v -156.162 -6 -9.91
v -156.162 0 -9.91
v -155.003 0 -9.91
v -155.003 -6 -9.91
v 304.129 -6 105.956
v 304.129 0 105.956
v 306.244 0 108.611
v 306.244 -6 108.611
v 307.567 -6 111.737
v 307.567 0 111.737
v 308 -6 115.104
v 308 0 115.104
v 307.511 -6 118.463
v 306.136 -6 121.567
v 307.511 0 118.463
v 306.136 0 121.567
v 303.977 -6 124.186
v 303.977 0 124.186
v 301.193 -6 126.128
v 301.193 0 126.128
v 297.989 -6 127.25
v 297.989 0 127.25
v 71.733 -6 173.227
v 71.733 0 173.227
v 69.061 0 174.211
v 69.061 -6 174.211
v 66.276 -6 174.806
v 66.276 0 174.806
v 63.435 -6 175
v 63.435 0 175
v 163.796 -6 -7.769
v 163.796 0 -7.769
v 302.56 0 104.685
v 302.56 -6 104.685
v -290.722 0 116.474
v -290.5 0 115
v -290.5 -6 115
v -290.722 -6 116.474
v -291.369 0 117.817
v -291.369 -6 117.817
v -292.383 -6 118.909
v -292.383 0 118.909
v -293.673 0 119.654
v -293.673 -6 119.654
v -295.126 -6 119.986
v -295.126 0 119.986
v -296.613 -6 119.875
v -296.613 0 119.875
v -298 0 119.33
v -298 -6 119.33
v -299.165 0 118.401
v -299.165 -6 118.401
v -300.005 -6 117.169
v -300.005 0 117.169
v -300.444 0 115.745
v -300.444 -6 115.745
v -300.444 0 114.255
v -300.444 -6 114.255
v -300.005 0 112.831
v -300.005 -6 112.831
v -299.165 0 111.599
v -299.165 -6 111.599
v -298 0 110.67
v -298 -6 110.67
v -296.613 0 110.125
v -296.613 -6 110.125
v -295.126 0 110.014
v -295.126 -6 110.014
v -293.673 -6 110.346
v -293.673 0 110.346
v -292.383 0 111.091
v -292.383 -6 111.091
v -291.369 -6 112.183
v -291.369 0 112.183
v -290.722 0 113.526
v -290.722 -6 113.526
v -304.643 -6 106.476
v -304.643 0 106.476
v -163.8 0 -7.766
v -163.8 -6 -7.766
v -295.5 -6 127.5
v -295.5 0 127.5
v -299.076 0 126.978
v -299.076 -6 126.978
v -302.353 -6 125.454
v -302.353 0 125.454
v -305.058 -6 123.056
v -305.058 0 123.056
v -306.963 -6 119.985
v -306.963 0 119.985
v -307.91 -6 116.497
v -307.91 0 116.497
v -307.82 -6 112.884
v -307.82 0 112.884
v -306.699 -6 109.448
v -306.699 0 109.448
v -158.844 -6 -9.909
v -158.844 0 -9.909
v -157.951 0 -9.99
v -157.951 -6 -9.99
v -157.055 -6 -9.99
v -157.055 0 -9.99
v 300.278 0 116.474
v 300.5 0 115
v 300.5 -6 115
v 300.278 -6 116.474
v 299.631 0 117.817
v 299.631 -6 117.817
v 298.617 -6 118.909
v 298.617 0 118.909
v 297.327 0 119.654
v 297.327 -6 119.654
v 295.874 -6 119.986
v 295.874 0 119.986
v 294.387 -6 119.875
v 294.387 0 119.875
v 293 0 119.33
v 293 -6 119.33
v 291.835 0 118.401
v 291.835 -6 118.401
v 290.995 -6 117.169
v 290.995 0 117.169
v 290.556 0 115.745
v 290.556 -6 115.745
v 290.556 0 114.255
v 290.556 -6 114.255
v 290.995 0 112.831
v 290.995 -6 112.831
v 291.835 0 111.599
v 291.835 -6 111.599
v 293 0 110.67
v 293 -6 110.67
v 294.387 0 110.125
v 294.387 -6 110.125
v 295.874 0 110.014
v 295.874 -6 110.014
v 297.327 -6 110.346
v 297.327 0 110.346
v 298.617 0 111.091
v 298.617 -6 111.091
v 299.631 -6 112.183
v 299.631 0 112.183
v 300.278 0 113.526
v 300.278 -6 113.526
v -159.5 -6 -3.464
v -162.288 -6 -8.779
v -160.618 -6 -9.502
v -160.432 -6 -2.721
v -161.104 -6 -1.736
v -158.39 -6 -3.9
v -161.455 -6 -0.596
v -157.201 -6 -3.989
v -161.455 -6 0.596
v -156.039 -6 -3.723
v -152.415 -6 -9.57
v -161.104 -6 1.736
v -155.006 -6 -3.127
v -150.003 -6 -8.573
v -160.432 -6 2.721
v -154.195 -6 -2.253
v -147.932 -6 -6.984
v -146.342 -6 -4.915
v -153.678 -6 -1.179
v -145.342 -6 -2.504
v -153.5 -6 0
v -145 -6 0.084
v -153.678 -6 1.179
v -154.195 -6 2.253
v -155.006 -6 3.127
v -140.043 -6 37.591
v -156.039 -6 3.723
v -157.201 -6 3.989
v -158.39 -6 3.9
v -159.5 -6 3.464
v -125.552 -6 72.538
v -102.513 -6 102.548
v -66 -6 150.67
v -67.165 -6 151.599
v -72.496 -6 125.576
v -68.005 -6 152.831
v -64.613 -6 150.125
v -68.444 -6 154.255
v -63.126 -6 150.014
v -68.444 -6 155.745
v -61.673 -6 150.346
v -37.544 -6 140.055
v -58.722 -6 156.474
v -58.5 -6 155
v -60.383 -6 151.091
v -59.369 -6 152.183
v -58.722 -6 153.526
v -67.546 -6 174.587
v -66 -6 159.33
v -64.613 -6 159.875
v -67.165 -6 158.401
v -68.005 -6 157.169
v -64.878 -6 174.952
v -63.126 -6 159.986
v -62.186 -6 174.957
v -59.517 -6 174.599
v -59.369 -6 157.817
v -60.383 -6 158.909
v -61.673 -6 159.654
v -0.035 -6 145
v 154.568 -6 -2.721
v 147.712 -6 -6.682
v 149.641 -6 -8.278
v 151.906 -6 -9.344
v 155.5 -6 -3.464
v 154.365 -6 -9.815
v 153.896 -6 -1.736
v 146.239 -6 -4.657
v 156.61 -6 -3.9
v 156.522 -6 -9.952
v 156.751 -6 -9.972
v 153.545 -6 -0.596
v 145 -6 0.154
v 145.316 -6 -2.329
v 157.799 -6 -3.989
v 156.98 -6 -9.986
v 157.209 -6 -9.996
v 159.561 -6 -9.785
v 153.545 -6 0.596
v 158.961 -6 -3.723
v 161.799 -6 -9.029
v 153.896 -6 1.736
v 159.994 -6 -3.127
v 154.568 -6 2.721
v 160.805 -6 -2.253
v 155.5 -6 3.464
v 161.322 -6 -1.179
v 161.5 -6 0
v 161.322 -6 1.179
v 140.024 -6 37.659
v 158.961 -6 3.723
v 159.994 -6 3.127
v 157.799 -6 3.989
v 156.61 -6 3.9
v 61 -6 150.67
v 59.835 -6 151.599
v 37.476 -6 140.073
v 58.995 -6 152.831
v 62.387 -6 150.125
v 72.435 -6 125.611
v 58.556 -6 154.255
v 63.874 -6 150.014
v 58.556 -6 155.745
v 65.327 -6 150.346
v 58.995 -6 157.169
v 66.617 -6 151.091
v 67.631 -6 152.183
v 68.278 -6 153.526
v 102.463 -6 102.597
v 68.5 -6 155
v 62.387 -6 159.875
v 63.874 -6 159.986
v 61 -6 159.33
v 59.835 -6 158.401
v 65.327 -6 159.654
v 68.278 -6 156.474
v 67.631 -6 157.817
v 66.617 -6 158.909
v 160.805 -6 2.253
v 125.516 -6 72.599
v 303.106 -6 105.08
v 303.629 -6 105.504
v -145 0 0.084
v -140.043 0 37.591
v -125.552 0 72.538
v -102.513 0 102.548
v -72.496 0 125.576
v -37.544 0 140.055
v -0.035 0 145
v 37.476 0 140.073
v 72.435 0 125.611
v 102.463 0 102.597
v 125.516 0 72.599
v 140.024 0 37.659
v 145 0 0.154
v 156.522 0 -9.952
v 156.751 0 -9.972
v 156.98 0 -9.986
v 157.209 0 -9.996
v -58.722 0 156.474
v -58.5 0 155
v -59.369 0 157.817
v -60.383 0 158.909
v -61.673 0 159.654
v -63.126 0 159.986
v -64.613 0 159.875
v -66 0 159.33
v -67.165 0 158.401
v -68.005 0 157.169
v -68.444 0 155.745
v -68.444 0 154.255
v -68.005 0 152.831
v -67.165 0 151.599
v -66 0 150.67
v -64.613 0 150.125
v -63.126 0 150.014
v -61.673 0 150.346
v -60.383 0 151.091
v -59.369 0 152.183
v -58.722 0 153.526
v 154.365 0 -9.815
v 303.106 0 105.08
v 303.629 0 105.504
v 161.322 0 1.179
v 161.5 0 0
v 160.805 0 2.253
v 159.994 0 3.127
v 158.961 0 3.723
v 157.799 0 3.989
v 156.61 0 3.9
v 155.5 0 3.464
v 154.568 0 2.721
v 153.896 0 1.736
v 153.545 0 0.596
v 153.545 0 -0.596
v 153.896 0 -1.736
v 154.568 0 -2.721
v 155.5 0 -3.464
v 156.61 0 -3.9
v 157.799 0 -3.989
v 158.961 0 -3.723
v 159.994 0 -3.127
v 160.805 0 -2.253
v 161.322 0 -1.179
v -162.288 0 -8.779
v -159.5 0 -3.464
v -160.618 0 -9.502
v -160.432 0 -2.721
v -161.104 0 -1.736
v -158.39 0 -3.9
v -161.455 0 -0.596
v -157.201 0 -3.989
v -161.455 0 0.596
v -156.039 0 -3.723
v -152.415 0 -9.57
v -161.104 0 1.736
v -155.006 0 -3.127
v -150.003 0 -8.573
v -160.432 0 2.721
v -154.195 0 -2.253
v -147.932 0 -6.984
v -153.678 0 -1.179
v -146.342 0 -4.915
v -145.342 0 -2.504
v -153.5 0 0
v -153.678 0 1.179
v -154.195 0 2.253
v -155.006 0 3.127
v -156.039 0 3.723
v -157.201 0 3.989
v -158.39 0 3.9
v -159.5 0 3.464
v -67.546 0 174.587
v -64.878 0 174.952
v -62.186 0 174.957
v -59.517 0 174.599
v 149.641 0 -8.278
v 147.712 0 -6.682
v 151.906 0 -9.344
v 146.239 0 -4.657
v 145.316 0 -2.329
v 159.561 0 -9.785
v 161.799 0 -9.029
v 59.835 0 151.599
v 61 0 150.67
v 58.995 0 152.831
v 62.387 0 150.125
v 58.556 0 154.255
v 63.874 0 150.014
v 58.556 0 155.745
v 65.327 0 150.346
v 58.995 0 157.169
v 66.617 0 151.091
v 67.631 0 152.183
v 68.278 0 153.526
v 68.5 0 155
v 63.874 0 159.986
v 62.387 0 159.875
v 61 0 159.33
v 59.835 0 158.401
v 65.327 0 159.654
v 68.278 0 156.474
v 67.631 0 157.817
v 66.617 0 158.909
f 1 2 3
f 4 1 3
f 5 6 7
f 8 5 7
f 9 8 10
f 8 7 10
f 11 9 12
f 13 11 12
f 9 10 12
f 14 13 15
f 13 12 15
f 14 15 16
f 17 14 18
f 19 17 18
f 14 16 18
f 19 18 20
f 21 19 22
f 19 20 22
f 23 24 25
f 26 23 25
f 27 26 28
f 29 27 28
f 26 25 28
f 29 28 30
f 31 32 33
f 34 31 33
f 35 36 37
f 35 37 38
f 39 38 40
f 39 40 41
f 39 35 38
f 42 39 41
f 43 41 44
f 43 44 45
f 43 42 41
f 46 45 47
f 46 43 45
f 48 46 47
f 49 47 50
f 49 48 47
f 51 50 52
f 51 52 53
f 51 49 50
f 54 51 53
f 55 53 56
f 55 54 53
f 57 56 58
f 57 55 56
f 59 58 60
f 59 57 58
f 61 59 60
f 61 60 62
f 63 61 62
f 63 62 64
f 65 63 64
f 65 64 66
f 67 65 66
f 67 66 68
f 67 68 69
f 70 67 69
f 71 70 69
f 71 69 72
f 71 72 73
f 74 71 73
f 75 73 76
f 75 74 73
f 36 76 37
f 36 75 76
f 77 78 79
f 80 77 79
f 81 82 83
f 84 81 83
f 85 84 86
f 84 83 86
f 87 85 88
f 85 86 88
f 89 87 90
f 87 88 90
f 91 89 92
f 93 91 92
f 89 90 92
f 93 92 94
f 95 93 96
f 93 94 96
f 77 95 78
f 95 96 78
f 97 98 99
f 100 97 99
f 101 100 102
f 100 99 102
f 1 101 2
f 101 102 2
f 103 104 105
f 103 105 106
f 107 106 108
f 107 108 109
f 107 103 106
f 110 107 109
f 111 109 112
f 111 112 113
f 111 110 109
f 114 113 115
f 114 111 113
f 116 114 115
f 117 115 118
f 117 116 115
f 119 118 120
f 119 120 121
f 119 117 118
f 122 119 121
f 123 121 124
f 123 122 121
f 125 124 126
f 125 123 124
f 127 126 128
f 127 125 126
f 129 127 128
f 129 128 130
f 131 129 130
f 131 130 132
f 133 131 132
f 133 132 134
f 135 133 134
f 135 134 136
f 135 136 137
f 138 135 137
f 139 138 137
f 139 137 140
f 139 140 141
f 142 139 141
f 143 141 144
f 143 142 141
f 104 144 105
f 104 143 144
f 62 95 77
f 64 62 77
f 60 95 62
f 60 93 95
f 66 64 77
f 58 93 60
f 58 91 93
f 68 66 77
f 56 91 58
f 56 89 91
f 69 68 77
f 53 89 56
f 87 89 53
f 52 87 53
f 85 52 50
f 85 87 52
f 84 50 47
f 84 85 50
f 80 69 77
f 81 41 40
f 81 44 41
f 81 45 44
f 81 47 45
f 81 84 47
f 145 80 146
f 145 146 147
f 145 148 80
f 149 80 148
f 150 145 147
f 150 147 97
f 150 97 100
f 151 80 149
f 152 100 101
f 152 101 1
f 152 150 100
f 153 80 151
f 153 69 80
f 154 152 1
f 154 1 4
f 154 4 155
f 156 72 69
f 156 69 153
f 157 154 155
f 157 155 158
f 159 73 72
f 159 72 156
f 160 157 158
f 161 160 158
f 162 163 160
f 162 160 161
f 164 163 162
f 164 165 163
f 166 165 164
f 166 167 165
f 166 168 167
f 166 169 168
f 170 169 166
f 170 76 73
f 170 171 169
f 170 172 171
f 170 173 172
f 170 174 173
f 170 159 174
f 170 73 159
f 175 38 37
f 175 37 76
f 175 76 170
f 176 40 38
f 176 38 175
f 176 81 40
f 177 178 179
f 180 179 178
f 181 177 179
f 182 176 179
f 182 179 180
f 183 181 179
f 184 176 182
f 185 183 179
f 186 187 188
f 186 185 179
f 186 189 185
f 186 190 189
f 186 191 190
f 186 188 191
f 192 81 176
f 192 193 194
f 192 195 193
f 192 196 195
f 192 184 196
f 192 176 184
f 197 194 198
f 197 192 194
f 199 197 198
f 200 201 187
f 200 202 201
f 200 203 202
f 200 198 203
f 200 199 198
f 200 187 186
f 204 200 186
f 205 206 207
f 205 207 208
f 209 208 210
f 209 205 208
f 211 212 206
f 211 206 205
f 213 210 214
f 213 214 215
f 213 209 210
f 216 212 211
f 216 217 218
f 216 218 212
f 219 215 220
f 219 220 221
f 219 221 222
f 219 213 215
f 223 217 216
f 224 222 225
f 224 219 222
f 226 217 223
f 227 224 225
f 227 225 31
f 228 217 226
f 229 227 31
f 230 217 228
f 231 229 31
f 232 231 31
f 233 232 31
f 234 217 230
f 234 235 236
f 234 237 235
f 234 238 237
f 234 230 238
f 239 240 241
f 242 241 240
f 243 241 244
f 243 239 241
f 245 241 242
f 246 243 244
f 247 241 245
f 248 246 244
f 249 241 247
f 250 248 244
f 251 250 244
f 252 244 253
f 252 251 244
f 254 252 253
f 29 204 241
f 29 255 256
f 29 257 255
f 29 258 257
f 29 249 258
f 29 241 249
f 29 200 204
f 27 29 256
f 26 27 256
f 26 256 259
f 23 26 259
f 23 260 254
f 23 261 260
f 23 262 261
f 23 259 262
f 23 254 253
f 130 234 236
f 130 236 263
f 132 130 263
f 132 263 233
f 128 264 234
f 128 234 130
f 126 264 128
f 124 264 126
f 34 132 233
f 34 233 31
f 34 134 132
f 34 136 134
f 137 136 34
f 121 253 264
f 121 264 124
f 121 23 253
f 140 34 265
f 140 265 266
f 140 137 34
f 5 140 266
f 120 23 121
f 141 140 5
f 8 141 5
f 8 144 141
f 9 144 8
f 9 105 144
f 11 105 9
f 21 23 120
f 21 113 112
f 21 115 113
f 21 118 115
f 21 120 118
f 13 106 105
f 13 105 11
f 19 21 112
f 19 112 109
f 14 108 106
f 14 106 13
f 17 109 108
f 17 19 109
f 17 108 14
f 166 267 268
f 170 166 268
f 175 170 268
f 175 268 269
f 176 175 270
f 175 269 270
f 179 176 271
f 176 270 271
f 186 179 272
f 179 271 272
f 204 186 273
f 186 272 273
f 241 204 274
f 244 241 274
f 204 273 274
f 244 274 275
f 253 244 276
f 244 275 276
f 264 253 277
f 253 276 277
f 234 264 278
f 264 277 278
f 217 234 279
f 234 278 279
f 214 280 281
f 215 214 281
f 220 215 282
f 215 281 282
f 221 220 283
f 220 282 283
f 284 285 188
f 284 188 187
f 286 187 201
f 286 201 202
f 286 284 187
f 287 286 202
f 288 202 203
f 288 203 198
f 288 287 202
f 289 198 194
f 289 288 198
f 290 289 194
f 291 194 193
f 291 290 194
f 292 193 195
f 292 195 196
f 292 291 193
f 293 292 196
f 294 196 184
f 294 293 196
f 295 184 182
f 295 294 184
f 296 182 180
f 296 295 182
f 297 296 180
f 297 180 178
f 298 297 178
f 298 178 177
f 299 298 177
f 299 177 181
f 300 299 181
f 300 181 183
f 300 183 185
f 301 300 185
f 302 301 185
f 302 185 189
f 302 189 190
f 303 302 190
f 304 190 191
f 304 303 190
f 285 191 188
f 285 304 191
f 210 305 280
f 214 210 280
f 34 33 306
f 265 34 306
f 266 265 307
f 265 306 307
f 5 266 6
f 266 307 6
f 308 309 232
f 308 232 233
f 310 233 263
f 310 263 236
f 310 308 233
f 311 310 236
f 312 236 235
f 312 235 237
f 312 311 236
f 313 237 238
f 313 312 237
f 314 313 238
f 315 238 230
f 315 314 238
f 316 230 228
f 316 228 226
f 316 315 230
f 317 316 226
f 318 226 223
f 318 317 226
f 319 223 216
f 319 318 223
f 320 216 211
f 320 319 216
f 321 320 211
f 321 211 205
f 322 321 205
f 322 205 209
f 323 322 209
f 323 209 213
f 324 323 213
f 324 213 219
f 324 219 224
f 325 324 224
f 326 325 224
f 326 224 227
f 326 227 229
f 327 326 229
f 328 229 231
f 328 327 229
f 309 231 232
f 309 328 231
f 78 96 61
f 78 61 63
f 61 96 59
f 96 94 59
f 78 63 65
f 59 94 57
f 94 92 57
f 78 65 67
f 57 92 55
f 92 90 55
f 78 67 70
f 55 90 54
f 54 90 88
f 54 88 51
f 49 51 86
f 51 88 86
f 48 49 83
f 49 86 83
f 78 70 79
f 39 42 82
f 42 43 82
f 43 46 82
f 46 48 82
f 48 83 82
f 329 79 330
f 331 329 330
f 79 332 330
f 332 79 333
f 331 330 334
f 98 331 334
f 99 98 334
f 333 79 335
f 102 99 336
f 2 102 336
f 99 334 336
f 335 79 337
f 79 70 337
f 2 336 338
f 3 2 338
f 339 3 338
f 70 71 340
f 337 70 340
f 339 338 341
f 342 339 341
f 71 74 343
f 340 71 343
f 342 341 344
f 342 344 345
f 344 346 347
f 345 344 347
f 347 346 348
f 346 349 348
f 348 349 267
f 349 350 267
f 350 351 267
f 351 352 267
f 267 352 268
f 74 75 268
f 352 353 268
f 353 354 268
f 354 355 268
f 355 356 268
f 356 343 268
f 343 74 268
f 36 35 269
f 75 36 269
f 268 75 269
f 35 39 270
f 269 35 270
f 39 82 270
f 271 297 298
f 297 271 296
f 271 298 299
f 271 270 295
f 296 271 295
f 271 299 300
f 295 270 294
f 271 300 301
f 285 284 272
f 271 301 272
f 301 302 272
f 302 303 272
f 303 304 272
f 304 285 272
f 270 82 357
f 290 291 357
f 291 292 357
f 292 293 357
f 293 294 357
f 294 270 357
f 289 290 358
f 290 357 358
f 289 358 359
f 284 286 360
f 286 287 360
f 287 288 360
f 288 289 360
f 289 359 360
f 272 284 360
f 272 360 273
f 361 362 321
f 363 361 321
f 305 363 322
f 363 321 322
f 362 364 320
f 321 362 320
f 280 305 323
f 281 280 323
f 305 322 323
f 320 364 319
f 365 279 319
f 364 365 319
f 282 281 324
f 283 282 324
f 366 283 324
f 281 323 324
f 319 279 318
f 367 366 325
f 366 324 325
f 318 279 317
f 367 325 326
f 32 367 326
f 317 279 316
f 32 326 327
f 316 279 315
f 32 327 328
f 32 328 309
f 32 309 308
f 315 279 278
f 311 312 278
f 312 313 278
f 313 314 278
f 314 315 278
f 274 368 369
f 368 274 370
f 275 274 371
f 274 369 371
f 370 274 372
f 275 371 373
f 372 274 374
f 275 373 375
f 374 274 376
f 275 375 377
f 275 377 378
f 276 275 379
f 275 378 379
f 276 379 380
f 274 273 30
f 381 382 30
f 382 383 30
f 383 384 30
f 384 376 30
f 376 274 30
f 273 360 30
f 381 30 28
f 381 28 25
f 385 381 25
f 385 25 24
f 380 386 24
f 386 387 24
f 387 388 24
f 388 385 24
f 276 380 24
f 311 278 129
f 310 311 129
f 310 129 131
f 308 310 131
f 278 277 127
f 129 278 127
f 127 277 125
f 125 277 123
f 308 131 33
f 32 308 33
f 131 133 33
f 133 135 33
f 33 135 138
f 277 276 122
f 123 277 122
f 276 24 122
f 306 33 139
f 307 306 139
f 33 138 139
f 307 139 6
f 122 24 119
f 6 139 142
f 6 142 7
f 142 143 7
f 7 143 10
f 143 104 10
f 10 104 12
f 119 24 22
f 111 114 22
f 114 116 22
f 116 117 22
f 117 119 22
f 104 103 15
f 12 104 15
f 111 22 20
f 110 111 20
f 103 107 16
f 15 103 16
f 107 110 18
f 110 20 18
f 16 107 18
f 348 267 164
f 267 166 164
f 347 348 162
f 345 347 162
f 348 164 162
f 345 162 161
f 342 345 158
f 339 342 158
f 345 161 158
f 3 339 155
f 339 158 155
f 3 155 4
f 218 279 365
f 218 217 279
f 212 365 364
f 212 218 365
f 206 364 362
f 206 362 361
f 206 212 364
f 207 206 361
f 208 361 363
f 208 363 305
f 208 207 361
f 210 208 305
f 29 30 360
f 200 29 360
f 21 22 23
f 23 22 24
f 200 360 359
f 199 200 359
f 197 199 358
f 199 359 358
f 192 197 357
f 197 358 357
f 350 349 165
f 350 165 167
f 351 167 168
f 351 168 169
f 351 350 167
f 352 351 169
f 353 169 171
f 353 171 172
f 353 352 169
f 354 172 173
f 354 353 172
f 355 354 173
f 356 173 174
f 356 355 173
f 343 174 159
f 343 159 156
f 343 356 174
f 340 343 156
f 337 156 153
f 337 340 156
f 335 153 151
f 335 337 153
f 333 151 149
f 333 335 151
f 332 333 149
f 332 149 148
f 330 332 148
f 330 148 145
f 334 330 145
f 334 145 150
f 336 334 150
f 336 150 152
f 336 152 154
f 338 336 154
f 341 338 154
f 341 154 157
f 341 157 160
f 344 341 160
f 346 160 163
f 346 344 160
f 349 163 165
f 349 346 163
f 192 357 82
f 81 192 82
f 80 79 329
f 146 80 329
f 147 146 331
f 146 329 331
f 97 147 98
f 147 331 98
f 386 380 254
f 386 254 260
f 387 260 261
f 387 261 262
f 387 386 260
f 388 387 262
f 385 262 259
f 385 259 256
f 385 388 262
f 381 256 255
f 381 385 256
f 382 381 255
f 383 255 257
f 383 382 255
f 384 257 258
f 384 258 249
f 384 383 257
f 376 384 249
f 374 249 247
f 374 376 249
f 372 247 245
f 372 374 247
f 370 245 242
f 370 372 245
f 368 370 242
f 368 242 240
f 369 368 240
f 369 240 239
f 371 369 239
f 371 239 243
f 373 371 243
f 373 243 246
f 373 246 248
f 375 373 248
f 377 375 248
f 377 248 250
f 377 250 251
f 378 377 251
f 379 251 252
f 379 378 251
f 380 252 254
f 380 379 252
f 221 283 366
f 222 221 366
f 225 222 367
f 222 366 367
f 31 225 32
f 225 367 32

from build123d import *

# Parameters (mm, degrees)
F0_R     = 4
F0_R_2   = 5
F1_DEPTH = 6
F2_R     = 10


with BuildPart() as f1:
    # F0 (on Front) → F1 (new body)
    with BuildSketch(Plane.XZ):
        with BuildLine():
            ThreePointArc((-144.660726, -9.91334), (-0.357114, 144.99956), (144.707801, -9.200666))
            Line((144.707801, -9.200666), (156.522168, -9.952077))
            Line((156.522168, -9.952077), (157.209119, -9.995769))
            ThreePointArc((157.209119, -9.995769), (160.702353, -9.47338), (163.796076, -7.769133))
            Line((163.796076, -7.769133), (302.56026, 104.68483))
            Line((302.56026, 104.68483), (304.128535, 105.955755))
            ThreePointArc((304.128535, 105.955755), (307.51077, 118.462861), (297.98923, 127.249642))
            Line((297.98923, 127.249642), (71.733118, 173.226787))
            ThreePointArc((71.733118, 173.226787), (67.679112, 174.558503), (63.434867, 174.999894))
            Line((63.434867, 174.999894), (-59.51749, 174.59948))
            ThreePointArc((-59.51749, 174.59948), (-63.53231, 174.999974), (-67.545815, 174.58651))
            Line((-67.545815, 174.58651), (-295.5, 127.5))
            ThreePointArc((-295.5, 127.5), (-306.963068, 119.984783), (-304.642546, 106.47569))
            Line((-304.642546, 106.47569), (-163.799516, -7.766344))
            ThreePointArc((-163.799516, -7.766344), (-161.469112, -9.17857), (-158.843996, -9.909272))
            Line((-158.843996, -9.909272), (-156.161689, -9.910041))
            Line((-156.161689, -9.910041), (-144.660726, -9.91334))
        make_face()
        with Locations((-157.5, 0)):
            Circle(F0_R, mode=Mode.SUBTRACT)
        with Locations((157.5, 0)):
            Circle(F0_R, mode=Mode.SUBTRACT)
        with Locations((-295.5, 115)):
            Circle(F0_R_2, mode=Mode.SUBTRACT)
        with Locations((-63.5, 155)):
            Circle(F0_R_2, mode=Mode.SUBTRACT)
        with Locations((295.5, 115)):
            Circle(F0_R_2, mode=Mode.SUBTRACT)
        with Locations((63.5, 155)):
            Circle(F0_R_2, mode=Mode.SUBTRACT)
        with BuildLine():
            Line((157.209119, -9.995769), (156.522168, -9.952077))
            ThreePointArc((156.522168, -9.952077), (156.865267, -9.979835), (157.209119, -9.995769))
        make_face()
        with BuildLine():
            ThreePointArc((-158.843996, -9.909272), (-157.502868, -10), (-156.161689, -9.910041))
            Line((-156.161689, -9.910041), (-158.843996, -9.909272))
        make_face()
        with BuildLine():
            Line((304.128535, 105.955755), (302.56026, 104.68483))
            ThreePointArc((302.56026, 104.68483), (303.370095, 105.288584), (304.128535, 105.955755))
        make_face()
    extrude(amount=F1_DEPTH)

    # F2
    f2_edges = [f1.edges().sort_by_distance(p)[0] for p in [
        (-144.660726, -3, -9.91334),
        (144.707801, -3, -9.200666),
    ]]
    fillet(f2_edges, radius=F2_R)


solid = f1.part
